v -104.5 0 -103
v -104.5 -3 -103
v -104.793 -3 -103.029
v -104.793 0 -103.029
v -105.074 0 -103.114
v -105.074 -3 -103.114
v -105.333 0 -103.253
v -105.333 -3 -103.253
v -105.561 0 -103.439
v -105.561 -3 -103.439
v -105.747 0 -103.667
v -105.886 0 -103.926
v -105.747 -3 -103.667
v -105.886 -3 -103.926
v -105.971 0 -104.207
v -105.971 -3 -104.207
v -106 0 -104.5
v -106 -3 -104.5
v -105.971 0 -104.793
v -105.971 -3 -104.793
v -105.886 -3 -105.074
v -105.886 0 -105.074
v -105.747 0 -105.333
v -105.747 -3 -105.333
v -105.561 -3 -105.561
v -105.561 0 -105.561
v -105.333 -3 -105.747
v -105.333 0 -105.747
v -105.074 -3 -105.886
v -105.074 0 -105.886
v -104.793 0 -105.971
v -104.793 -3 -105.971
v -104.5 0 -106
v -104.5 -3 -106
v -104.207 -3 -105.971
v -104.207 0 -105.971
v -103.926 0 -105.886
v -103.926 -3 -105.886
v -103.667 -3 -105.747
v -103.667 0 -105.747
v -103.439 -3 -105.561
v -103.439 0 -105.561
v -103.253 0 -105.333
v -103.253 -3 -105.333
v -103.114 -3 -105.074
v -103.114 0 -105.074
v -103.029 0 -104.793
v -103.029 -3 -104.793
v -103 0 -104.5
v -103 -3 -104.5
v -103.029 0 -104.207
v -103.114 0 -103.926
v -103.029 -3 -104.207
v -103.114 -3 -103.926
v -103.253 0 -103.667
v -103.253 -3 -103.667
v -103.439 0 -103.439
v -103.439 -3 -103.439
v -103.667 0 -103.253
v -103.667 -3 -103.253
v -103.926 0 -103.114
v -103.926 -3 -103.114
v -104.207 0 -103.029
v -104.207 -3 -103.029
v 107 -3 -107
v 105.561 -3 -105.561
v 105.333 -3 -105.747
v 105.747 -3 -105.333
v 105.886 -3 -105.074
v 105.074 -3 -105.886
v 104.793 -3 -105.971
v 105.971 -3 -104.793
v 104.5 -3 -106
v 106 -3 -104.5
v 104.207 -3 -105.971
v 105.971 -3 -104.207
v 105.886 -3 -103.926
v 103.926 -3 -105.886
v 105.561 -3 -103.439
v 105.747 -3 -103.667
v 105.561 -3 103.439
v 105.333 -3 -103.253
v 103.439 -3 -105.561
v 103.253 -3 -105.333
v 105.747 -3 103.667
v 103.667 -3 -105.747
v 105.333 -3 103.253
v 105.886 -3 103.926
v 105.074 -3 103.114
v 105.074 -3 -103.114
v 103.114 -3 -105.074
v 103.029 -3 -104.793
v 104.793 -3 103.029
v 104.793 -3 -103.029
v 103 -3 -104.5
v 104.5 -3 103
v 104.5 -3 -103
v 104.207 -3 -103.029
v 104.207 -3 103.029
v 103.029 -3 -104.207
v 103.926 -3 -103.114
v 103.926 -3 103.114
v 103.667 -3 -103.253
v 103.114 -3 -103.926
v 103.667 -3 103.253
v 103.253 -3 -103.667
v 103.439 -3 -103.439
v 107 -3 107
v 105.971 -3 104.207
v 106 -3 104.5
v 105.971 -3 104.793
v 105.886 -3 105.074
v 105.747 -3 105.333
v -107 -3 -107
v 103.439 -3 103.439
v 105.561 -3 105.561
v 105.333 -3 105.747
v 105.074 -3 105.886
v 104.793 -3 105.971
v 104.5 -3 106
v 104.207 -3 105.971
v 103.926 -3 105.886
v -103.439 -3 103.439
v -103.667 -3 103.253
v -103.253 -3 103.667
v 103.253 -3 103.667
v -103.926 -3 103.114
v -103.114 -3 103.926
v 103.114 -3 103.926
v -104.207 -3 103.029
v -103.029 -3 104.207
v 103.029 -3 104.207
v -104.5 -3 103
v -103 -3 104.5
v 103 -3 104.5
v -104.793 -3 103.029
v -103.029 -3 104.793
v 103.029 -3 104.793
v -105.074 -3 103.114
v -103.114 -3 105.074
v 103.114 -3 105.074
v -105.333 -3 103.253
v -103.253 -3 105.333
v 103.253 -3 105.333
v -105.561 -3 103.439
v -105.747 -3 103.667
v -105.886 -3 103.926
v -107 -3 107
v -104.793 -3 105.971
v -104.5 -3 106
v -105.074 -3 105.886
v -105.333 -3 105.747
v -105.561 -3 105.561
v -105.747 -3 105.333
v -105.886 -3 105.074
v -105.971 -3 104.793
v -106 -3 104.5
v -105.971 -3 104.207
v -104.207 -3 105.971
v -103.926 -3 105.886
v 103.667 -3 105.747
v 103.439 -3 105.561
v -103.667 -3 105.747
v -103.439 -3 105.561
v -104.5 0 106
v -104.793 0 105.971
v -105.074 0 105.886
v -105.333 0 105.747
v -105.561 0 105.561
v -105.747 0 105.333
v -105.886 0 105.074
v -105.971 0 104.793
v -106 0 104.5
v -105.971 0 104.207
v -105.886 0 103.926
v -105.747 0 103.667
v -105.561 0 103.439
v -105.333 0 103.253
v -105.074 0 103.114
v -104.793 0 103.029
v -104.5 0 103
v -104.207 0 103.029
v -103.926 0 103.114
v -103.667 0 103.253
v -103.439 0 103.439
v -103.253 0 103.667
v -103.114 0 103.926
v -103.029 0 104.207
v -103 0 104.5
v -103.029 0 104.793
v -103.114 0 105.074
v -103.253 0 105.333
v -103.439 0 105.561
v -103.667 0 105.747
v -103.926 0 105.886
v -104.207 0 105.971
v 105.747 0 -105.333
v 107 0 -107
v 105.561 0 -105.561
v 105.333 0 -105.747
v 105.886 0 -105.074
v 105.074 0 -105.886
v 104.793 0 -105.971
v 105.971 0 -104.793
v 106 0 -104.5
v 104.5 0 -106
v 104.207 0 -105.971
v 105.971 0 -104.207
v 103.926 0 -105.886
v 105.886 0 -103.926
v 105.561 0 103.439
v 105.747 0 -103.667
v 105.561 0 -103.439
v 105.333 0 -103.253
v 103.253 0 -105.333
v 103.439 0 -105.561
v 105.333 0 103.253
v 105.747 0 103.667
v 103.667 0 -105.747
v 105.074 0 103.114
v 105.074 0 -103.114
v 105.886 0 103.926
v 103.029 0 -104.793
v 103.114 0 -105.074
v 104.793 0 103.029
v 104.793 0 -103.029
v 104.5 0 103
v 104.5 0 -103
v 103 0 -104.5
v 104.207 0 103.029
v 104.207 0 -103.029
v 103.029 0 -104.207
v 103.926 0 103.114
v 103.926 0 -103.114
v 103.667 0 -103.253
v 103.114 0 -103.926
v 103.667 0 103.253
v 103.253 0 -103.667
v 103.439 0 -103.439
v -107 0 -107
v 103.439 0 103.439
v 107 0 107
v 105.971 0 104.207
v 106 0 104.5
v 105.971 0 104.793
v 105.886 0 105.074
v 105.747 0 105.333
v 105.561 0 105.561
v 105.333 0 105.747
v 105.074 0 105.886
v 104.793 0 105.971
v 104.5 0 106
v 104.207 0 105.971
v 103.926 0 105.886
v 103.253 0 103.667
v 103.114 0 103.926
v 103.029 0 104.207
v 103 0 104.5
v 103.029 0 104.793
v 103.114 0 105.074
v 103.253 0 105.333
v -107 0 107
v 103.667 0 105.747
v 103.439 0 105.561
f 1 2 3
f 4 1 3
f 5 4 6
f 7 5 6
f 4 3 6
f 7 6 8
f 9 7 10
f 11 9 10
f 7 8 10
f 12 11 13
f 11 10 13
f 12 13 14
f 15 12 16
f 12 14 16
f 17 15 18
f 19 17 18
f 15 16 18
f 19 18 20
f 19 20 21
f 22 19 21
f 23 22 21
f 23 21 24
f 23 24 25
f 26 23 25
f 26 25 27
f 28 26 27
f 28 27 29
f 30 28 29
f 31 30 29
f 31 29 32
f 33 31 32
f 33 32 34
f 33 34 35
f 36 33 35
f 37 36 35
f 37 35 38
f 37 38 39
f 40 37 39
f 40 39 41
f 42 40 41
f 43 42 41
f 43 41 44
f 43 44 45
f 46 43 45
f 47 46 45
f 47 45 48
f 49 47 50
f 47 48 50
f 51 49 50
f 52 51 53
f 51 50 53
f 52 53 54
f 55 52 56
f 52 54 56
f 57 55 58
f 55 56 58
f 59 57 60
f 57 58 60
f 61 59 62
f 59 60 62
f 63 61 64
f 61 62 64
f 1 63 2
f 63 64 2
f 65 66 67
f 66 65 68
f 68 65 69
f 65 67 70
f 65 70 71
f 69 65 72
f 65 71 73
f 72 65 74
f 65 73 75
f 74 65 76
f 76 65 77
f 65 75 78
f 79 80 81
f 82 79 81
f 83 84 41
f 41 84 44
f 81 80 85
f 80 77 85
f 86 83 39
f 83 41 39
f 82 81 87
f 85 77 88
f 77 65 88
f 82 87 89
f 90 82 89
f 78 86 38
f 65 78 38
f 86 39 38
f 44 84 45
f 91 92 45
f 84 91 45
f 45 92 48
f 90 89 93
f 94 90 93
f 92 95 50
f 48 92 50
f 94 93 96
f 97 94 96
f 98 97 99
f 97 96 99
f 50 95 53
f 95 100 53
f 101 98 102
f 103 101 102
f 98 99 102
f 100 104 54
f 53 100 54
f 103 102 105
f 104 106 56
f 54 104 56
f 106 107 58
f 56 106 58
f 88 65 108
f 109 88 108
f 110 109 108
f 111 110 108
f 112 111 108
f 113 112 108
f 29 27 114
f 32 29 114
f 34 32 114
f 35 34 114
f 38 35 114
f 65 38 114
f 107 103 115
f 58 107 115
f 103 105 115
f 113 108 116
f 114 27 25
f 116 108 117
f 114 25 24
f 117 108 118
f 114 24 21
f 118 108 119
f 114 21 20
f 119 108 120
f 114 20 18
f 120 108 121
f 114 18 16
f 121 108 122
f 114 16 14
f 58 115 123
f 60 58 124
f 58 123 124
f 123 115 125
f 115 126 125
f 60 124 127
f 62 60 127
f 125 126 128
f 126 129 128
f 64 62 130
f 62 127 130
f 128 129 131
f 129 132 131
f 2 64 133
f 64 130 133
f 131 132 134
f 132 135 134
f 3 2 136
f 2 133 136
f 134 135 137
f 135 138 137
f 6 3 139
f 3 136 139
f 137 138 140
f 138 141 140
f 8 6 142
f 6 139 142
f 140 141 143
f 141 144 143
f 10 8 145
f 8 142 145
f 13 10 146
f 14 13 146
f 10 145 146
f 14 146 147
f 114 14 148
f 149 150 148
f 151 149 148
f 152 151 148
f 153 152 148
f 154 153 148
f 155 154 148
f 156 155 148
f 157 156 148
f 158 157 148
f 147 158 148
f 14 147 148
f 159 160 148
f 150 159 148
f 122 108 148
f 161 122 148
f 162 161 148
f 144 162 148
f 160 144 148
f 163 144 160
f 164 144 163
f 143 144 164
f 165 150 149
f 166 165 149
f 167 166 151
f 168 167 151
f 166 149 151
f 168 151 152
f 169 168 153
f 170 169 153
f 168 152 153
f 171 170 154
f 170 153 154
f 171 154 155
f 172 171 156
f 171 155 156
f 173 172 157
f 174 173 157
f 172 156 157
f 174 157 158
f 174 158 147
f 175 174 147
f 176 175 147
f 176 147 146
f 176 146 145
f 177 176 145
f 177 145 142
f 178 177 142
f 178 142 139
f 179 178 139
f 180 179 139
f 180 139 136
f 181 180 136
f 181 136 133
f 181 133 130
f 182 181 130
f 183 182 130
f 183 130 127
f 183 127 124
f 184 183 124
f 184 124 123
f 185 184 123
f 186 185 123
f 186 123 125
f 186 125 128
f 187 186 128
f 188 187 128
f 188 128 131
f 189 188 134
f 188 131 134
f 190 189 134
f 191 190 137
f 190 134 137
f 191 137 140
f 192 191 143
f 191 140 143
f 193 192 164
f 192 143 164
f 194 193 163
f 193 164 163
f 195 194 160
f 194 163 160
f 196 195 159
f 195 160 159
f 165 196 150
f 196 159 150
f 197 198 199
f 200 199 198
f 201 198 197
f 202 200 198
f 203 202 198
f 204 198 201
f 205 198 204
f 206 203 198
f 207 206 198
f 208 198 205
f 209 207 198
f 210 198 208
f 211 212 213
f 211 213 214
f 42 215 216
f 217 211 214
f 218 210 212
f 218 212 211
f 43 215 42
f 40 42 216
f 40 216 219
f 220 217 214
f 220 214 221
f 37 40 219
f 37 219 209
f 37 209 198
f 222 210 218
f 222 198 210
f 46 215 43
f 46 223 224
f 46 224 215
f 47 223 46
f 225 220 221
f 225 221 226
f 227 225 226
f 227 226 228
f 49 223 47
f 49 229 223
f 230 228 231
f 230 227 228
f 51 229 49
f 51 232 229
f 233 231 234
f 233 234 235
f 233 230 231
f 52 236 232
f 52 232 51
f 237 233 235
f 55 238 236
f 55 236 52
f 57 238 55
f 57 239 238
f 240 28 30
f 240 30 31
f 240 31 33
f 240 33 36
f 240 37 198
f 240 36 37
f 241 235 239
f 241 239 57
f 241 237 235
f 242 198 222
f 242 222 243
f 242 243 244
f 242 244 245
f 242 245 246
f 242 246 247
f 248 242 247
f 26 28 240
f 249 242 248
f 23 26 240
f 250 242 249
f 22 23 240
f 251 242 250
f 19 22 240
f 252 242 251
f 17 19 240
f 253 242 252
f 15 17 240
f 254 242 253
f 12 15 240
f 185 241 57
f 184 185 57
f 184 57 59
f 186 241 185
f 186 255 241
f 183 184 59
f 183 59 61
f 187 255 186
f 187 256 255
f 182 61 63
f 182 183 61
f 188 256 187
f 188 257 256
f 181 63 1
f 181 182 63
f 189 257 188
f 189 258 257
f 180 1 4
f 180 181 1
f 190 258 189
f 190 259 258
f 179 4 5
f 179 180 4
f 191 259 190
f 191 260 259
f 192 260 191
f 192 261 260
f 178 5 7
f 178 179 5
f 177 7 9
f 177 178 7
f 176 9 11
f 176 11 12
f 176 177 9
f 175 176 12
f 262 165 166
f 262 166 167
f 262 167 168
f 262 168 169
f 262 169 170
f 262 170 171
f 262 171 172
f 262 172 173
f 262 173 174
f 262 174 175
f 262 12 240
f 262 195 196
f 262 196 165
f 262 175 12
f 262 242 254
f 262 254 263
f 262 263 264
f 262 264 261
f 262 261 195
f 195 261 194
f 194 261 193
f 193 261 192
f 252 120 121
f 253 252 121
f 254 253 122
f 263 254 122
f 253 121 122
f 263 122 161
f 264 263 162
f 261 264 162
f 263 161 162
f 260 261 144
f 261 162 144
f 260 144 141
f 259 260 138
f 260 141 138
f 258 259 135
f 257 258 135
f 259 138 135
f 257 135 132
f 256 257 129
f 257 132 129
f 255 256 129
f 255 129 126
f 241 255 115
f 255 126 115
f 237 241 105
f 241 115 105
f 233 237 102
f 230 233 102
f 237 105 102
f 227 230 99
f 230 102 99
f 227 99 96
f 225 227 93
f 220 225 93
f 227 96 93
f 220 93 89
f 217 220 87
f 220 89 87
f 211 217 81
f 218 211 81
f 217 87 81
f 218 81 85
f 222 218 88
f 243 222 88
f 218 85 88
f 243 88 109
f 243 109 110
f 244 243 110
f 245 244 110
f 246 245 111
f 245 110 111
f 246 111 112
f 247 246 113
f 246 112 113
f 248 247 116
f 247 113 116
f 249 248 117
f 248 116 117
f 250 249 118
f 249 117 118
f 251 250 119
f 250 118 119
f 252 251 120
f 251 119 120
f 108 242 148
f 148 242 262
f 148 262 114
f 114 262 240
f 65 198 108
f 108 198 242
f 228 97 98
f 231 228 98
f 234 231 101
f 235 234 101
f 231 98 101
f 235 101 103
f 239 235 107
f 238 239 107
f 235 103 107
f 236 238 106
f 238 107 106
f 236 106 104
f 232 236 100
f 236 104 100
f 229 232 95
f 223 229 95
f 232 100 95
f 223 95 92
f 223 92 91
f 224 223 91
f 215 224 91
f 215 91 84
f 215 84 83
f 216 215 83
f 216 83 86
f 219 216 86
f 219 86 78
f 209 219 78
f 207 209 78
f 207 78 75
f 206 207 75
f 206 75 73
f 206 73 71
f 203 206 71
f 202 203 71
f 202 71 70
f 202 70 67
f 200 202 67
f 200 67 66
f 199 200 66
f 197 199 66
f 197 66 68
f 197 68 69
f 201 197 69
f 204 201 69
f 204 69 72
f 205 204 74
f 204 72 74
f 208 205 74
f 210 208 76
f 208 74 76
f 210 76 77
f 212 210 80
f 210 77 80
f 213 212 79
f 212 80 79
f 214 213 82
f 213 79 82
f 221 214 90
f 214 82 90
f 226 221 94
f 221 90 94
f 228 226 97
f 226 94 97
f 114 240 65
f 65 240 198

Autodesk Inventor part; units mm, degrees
ref_plane "YZ Plane" through (0, 0, 0) normal (1, 0, 0) x (0, 1, 0)
ref_plane "XZ Plane" through (0, 0, 0) normal (0, 1, 0) x (-1, 0, 0)
ref_plane "XY Plane" through (0, 0, 0) normal (0, 0, 1) x (1, 0, 0)
sketch "Sketch1" plane through (0, 0, 0) normal (0, 1, 0) x (-1, 0, 0)
  line L0 (-107, 107) -> (107, 107)
  line L1 (107, 107) -> (107, -107)
  line L2 (107, -107) -> (-107, -107)
  line L3 (-107, -107) -> (-107, 107)
  line L4 (104.5, 104.5) -> (-104.5, 104.5)
  line L5 (-104.5, 104.5) -> (-104.5, -104.5)
  line L6 (-104.5, -104.5) -> (104.5, -104.5)
  line L7 (104.5, -104.5) -> (104.5, 104.5)
  line L8 (-107, 107) -> (107, 107) construction
  line L9 (107, 107) -> (107, -107) construction
  line L10 (107, -107) -> (-107, -107) construction
  line L11 (-107, -107) -> (-107, 107) construction
  point P0 (0, 0)
  dimension "d0" = 214
  dimension "d1" = 214
  dimension "d2" = 107
  dimension "d3" = 107
  dimension "d4" = 209
  dimension "d5" = 209
  dimension "d6" = 104.5
  dimension "d7" = 104.5
extrude "Extrusion1" add sketch "Sketch1" against normal blind 3 contours L0 L1 L2 L3 | L7 L6 L5 L4
hole "Hole1" at (104.5, 0, 104.5) at (-104.5, 0, 104.5) at (-104.5, 0, -104.5) at (104.5, 0, -104.5) direction (0, -1, 0) diameter 3 depth 8 tip angle 118
decal "Decal1"
properties part number "HEATBED MK3" material "Aluminum"
